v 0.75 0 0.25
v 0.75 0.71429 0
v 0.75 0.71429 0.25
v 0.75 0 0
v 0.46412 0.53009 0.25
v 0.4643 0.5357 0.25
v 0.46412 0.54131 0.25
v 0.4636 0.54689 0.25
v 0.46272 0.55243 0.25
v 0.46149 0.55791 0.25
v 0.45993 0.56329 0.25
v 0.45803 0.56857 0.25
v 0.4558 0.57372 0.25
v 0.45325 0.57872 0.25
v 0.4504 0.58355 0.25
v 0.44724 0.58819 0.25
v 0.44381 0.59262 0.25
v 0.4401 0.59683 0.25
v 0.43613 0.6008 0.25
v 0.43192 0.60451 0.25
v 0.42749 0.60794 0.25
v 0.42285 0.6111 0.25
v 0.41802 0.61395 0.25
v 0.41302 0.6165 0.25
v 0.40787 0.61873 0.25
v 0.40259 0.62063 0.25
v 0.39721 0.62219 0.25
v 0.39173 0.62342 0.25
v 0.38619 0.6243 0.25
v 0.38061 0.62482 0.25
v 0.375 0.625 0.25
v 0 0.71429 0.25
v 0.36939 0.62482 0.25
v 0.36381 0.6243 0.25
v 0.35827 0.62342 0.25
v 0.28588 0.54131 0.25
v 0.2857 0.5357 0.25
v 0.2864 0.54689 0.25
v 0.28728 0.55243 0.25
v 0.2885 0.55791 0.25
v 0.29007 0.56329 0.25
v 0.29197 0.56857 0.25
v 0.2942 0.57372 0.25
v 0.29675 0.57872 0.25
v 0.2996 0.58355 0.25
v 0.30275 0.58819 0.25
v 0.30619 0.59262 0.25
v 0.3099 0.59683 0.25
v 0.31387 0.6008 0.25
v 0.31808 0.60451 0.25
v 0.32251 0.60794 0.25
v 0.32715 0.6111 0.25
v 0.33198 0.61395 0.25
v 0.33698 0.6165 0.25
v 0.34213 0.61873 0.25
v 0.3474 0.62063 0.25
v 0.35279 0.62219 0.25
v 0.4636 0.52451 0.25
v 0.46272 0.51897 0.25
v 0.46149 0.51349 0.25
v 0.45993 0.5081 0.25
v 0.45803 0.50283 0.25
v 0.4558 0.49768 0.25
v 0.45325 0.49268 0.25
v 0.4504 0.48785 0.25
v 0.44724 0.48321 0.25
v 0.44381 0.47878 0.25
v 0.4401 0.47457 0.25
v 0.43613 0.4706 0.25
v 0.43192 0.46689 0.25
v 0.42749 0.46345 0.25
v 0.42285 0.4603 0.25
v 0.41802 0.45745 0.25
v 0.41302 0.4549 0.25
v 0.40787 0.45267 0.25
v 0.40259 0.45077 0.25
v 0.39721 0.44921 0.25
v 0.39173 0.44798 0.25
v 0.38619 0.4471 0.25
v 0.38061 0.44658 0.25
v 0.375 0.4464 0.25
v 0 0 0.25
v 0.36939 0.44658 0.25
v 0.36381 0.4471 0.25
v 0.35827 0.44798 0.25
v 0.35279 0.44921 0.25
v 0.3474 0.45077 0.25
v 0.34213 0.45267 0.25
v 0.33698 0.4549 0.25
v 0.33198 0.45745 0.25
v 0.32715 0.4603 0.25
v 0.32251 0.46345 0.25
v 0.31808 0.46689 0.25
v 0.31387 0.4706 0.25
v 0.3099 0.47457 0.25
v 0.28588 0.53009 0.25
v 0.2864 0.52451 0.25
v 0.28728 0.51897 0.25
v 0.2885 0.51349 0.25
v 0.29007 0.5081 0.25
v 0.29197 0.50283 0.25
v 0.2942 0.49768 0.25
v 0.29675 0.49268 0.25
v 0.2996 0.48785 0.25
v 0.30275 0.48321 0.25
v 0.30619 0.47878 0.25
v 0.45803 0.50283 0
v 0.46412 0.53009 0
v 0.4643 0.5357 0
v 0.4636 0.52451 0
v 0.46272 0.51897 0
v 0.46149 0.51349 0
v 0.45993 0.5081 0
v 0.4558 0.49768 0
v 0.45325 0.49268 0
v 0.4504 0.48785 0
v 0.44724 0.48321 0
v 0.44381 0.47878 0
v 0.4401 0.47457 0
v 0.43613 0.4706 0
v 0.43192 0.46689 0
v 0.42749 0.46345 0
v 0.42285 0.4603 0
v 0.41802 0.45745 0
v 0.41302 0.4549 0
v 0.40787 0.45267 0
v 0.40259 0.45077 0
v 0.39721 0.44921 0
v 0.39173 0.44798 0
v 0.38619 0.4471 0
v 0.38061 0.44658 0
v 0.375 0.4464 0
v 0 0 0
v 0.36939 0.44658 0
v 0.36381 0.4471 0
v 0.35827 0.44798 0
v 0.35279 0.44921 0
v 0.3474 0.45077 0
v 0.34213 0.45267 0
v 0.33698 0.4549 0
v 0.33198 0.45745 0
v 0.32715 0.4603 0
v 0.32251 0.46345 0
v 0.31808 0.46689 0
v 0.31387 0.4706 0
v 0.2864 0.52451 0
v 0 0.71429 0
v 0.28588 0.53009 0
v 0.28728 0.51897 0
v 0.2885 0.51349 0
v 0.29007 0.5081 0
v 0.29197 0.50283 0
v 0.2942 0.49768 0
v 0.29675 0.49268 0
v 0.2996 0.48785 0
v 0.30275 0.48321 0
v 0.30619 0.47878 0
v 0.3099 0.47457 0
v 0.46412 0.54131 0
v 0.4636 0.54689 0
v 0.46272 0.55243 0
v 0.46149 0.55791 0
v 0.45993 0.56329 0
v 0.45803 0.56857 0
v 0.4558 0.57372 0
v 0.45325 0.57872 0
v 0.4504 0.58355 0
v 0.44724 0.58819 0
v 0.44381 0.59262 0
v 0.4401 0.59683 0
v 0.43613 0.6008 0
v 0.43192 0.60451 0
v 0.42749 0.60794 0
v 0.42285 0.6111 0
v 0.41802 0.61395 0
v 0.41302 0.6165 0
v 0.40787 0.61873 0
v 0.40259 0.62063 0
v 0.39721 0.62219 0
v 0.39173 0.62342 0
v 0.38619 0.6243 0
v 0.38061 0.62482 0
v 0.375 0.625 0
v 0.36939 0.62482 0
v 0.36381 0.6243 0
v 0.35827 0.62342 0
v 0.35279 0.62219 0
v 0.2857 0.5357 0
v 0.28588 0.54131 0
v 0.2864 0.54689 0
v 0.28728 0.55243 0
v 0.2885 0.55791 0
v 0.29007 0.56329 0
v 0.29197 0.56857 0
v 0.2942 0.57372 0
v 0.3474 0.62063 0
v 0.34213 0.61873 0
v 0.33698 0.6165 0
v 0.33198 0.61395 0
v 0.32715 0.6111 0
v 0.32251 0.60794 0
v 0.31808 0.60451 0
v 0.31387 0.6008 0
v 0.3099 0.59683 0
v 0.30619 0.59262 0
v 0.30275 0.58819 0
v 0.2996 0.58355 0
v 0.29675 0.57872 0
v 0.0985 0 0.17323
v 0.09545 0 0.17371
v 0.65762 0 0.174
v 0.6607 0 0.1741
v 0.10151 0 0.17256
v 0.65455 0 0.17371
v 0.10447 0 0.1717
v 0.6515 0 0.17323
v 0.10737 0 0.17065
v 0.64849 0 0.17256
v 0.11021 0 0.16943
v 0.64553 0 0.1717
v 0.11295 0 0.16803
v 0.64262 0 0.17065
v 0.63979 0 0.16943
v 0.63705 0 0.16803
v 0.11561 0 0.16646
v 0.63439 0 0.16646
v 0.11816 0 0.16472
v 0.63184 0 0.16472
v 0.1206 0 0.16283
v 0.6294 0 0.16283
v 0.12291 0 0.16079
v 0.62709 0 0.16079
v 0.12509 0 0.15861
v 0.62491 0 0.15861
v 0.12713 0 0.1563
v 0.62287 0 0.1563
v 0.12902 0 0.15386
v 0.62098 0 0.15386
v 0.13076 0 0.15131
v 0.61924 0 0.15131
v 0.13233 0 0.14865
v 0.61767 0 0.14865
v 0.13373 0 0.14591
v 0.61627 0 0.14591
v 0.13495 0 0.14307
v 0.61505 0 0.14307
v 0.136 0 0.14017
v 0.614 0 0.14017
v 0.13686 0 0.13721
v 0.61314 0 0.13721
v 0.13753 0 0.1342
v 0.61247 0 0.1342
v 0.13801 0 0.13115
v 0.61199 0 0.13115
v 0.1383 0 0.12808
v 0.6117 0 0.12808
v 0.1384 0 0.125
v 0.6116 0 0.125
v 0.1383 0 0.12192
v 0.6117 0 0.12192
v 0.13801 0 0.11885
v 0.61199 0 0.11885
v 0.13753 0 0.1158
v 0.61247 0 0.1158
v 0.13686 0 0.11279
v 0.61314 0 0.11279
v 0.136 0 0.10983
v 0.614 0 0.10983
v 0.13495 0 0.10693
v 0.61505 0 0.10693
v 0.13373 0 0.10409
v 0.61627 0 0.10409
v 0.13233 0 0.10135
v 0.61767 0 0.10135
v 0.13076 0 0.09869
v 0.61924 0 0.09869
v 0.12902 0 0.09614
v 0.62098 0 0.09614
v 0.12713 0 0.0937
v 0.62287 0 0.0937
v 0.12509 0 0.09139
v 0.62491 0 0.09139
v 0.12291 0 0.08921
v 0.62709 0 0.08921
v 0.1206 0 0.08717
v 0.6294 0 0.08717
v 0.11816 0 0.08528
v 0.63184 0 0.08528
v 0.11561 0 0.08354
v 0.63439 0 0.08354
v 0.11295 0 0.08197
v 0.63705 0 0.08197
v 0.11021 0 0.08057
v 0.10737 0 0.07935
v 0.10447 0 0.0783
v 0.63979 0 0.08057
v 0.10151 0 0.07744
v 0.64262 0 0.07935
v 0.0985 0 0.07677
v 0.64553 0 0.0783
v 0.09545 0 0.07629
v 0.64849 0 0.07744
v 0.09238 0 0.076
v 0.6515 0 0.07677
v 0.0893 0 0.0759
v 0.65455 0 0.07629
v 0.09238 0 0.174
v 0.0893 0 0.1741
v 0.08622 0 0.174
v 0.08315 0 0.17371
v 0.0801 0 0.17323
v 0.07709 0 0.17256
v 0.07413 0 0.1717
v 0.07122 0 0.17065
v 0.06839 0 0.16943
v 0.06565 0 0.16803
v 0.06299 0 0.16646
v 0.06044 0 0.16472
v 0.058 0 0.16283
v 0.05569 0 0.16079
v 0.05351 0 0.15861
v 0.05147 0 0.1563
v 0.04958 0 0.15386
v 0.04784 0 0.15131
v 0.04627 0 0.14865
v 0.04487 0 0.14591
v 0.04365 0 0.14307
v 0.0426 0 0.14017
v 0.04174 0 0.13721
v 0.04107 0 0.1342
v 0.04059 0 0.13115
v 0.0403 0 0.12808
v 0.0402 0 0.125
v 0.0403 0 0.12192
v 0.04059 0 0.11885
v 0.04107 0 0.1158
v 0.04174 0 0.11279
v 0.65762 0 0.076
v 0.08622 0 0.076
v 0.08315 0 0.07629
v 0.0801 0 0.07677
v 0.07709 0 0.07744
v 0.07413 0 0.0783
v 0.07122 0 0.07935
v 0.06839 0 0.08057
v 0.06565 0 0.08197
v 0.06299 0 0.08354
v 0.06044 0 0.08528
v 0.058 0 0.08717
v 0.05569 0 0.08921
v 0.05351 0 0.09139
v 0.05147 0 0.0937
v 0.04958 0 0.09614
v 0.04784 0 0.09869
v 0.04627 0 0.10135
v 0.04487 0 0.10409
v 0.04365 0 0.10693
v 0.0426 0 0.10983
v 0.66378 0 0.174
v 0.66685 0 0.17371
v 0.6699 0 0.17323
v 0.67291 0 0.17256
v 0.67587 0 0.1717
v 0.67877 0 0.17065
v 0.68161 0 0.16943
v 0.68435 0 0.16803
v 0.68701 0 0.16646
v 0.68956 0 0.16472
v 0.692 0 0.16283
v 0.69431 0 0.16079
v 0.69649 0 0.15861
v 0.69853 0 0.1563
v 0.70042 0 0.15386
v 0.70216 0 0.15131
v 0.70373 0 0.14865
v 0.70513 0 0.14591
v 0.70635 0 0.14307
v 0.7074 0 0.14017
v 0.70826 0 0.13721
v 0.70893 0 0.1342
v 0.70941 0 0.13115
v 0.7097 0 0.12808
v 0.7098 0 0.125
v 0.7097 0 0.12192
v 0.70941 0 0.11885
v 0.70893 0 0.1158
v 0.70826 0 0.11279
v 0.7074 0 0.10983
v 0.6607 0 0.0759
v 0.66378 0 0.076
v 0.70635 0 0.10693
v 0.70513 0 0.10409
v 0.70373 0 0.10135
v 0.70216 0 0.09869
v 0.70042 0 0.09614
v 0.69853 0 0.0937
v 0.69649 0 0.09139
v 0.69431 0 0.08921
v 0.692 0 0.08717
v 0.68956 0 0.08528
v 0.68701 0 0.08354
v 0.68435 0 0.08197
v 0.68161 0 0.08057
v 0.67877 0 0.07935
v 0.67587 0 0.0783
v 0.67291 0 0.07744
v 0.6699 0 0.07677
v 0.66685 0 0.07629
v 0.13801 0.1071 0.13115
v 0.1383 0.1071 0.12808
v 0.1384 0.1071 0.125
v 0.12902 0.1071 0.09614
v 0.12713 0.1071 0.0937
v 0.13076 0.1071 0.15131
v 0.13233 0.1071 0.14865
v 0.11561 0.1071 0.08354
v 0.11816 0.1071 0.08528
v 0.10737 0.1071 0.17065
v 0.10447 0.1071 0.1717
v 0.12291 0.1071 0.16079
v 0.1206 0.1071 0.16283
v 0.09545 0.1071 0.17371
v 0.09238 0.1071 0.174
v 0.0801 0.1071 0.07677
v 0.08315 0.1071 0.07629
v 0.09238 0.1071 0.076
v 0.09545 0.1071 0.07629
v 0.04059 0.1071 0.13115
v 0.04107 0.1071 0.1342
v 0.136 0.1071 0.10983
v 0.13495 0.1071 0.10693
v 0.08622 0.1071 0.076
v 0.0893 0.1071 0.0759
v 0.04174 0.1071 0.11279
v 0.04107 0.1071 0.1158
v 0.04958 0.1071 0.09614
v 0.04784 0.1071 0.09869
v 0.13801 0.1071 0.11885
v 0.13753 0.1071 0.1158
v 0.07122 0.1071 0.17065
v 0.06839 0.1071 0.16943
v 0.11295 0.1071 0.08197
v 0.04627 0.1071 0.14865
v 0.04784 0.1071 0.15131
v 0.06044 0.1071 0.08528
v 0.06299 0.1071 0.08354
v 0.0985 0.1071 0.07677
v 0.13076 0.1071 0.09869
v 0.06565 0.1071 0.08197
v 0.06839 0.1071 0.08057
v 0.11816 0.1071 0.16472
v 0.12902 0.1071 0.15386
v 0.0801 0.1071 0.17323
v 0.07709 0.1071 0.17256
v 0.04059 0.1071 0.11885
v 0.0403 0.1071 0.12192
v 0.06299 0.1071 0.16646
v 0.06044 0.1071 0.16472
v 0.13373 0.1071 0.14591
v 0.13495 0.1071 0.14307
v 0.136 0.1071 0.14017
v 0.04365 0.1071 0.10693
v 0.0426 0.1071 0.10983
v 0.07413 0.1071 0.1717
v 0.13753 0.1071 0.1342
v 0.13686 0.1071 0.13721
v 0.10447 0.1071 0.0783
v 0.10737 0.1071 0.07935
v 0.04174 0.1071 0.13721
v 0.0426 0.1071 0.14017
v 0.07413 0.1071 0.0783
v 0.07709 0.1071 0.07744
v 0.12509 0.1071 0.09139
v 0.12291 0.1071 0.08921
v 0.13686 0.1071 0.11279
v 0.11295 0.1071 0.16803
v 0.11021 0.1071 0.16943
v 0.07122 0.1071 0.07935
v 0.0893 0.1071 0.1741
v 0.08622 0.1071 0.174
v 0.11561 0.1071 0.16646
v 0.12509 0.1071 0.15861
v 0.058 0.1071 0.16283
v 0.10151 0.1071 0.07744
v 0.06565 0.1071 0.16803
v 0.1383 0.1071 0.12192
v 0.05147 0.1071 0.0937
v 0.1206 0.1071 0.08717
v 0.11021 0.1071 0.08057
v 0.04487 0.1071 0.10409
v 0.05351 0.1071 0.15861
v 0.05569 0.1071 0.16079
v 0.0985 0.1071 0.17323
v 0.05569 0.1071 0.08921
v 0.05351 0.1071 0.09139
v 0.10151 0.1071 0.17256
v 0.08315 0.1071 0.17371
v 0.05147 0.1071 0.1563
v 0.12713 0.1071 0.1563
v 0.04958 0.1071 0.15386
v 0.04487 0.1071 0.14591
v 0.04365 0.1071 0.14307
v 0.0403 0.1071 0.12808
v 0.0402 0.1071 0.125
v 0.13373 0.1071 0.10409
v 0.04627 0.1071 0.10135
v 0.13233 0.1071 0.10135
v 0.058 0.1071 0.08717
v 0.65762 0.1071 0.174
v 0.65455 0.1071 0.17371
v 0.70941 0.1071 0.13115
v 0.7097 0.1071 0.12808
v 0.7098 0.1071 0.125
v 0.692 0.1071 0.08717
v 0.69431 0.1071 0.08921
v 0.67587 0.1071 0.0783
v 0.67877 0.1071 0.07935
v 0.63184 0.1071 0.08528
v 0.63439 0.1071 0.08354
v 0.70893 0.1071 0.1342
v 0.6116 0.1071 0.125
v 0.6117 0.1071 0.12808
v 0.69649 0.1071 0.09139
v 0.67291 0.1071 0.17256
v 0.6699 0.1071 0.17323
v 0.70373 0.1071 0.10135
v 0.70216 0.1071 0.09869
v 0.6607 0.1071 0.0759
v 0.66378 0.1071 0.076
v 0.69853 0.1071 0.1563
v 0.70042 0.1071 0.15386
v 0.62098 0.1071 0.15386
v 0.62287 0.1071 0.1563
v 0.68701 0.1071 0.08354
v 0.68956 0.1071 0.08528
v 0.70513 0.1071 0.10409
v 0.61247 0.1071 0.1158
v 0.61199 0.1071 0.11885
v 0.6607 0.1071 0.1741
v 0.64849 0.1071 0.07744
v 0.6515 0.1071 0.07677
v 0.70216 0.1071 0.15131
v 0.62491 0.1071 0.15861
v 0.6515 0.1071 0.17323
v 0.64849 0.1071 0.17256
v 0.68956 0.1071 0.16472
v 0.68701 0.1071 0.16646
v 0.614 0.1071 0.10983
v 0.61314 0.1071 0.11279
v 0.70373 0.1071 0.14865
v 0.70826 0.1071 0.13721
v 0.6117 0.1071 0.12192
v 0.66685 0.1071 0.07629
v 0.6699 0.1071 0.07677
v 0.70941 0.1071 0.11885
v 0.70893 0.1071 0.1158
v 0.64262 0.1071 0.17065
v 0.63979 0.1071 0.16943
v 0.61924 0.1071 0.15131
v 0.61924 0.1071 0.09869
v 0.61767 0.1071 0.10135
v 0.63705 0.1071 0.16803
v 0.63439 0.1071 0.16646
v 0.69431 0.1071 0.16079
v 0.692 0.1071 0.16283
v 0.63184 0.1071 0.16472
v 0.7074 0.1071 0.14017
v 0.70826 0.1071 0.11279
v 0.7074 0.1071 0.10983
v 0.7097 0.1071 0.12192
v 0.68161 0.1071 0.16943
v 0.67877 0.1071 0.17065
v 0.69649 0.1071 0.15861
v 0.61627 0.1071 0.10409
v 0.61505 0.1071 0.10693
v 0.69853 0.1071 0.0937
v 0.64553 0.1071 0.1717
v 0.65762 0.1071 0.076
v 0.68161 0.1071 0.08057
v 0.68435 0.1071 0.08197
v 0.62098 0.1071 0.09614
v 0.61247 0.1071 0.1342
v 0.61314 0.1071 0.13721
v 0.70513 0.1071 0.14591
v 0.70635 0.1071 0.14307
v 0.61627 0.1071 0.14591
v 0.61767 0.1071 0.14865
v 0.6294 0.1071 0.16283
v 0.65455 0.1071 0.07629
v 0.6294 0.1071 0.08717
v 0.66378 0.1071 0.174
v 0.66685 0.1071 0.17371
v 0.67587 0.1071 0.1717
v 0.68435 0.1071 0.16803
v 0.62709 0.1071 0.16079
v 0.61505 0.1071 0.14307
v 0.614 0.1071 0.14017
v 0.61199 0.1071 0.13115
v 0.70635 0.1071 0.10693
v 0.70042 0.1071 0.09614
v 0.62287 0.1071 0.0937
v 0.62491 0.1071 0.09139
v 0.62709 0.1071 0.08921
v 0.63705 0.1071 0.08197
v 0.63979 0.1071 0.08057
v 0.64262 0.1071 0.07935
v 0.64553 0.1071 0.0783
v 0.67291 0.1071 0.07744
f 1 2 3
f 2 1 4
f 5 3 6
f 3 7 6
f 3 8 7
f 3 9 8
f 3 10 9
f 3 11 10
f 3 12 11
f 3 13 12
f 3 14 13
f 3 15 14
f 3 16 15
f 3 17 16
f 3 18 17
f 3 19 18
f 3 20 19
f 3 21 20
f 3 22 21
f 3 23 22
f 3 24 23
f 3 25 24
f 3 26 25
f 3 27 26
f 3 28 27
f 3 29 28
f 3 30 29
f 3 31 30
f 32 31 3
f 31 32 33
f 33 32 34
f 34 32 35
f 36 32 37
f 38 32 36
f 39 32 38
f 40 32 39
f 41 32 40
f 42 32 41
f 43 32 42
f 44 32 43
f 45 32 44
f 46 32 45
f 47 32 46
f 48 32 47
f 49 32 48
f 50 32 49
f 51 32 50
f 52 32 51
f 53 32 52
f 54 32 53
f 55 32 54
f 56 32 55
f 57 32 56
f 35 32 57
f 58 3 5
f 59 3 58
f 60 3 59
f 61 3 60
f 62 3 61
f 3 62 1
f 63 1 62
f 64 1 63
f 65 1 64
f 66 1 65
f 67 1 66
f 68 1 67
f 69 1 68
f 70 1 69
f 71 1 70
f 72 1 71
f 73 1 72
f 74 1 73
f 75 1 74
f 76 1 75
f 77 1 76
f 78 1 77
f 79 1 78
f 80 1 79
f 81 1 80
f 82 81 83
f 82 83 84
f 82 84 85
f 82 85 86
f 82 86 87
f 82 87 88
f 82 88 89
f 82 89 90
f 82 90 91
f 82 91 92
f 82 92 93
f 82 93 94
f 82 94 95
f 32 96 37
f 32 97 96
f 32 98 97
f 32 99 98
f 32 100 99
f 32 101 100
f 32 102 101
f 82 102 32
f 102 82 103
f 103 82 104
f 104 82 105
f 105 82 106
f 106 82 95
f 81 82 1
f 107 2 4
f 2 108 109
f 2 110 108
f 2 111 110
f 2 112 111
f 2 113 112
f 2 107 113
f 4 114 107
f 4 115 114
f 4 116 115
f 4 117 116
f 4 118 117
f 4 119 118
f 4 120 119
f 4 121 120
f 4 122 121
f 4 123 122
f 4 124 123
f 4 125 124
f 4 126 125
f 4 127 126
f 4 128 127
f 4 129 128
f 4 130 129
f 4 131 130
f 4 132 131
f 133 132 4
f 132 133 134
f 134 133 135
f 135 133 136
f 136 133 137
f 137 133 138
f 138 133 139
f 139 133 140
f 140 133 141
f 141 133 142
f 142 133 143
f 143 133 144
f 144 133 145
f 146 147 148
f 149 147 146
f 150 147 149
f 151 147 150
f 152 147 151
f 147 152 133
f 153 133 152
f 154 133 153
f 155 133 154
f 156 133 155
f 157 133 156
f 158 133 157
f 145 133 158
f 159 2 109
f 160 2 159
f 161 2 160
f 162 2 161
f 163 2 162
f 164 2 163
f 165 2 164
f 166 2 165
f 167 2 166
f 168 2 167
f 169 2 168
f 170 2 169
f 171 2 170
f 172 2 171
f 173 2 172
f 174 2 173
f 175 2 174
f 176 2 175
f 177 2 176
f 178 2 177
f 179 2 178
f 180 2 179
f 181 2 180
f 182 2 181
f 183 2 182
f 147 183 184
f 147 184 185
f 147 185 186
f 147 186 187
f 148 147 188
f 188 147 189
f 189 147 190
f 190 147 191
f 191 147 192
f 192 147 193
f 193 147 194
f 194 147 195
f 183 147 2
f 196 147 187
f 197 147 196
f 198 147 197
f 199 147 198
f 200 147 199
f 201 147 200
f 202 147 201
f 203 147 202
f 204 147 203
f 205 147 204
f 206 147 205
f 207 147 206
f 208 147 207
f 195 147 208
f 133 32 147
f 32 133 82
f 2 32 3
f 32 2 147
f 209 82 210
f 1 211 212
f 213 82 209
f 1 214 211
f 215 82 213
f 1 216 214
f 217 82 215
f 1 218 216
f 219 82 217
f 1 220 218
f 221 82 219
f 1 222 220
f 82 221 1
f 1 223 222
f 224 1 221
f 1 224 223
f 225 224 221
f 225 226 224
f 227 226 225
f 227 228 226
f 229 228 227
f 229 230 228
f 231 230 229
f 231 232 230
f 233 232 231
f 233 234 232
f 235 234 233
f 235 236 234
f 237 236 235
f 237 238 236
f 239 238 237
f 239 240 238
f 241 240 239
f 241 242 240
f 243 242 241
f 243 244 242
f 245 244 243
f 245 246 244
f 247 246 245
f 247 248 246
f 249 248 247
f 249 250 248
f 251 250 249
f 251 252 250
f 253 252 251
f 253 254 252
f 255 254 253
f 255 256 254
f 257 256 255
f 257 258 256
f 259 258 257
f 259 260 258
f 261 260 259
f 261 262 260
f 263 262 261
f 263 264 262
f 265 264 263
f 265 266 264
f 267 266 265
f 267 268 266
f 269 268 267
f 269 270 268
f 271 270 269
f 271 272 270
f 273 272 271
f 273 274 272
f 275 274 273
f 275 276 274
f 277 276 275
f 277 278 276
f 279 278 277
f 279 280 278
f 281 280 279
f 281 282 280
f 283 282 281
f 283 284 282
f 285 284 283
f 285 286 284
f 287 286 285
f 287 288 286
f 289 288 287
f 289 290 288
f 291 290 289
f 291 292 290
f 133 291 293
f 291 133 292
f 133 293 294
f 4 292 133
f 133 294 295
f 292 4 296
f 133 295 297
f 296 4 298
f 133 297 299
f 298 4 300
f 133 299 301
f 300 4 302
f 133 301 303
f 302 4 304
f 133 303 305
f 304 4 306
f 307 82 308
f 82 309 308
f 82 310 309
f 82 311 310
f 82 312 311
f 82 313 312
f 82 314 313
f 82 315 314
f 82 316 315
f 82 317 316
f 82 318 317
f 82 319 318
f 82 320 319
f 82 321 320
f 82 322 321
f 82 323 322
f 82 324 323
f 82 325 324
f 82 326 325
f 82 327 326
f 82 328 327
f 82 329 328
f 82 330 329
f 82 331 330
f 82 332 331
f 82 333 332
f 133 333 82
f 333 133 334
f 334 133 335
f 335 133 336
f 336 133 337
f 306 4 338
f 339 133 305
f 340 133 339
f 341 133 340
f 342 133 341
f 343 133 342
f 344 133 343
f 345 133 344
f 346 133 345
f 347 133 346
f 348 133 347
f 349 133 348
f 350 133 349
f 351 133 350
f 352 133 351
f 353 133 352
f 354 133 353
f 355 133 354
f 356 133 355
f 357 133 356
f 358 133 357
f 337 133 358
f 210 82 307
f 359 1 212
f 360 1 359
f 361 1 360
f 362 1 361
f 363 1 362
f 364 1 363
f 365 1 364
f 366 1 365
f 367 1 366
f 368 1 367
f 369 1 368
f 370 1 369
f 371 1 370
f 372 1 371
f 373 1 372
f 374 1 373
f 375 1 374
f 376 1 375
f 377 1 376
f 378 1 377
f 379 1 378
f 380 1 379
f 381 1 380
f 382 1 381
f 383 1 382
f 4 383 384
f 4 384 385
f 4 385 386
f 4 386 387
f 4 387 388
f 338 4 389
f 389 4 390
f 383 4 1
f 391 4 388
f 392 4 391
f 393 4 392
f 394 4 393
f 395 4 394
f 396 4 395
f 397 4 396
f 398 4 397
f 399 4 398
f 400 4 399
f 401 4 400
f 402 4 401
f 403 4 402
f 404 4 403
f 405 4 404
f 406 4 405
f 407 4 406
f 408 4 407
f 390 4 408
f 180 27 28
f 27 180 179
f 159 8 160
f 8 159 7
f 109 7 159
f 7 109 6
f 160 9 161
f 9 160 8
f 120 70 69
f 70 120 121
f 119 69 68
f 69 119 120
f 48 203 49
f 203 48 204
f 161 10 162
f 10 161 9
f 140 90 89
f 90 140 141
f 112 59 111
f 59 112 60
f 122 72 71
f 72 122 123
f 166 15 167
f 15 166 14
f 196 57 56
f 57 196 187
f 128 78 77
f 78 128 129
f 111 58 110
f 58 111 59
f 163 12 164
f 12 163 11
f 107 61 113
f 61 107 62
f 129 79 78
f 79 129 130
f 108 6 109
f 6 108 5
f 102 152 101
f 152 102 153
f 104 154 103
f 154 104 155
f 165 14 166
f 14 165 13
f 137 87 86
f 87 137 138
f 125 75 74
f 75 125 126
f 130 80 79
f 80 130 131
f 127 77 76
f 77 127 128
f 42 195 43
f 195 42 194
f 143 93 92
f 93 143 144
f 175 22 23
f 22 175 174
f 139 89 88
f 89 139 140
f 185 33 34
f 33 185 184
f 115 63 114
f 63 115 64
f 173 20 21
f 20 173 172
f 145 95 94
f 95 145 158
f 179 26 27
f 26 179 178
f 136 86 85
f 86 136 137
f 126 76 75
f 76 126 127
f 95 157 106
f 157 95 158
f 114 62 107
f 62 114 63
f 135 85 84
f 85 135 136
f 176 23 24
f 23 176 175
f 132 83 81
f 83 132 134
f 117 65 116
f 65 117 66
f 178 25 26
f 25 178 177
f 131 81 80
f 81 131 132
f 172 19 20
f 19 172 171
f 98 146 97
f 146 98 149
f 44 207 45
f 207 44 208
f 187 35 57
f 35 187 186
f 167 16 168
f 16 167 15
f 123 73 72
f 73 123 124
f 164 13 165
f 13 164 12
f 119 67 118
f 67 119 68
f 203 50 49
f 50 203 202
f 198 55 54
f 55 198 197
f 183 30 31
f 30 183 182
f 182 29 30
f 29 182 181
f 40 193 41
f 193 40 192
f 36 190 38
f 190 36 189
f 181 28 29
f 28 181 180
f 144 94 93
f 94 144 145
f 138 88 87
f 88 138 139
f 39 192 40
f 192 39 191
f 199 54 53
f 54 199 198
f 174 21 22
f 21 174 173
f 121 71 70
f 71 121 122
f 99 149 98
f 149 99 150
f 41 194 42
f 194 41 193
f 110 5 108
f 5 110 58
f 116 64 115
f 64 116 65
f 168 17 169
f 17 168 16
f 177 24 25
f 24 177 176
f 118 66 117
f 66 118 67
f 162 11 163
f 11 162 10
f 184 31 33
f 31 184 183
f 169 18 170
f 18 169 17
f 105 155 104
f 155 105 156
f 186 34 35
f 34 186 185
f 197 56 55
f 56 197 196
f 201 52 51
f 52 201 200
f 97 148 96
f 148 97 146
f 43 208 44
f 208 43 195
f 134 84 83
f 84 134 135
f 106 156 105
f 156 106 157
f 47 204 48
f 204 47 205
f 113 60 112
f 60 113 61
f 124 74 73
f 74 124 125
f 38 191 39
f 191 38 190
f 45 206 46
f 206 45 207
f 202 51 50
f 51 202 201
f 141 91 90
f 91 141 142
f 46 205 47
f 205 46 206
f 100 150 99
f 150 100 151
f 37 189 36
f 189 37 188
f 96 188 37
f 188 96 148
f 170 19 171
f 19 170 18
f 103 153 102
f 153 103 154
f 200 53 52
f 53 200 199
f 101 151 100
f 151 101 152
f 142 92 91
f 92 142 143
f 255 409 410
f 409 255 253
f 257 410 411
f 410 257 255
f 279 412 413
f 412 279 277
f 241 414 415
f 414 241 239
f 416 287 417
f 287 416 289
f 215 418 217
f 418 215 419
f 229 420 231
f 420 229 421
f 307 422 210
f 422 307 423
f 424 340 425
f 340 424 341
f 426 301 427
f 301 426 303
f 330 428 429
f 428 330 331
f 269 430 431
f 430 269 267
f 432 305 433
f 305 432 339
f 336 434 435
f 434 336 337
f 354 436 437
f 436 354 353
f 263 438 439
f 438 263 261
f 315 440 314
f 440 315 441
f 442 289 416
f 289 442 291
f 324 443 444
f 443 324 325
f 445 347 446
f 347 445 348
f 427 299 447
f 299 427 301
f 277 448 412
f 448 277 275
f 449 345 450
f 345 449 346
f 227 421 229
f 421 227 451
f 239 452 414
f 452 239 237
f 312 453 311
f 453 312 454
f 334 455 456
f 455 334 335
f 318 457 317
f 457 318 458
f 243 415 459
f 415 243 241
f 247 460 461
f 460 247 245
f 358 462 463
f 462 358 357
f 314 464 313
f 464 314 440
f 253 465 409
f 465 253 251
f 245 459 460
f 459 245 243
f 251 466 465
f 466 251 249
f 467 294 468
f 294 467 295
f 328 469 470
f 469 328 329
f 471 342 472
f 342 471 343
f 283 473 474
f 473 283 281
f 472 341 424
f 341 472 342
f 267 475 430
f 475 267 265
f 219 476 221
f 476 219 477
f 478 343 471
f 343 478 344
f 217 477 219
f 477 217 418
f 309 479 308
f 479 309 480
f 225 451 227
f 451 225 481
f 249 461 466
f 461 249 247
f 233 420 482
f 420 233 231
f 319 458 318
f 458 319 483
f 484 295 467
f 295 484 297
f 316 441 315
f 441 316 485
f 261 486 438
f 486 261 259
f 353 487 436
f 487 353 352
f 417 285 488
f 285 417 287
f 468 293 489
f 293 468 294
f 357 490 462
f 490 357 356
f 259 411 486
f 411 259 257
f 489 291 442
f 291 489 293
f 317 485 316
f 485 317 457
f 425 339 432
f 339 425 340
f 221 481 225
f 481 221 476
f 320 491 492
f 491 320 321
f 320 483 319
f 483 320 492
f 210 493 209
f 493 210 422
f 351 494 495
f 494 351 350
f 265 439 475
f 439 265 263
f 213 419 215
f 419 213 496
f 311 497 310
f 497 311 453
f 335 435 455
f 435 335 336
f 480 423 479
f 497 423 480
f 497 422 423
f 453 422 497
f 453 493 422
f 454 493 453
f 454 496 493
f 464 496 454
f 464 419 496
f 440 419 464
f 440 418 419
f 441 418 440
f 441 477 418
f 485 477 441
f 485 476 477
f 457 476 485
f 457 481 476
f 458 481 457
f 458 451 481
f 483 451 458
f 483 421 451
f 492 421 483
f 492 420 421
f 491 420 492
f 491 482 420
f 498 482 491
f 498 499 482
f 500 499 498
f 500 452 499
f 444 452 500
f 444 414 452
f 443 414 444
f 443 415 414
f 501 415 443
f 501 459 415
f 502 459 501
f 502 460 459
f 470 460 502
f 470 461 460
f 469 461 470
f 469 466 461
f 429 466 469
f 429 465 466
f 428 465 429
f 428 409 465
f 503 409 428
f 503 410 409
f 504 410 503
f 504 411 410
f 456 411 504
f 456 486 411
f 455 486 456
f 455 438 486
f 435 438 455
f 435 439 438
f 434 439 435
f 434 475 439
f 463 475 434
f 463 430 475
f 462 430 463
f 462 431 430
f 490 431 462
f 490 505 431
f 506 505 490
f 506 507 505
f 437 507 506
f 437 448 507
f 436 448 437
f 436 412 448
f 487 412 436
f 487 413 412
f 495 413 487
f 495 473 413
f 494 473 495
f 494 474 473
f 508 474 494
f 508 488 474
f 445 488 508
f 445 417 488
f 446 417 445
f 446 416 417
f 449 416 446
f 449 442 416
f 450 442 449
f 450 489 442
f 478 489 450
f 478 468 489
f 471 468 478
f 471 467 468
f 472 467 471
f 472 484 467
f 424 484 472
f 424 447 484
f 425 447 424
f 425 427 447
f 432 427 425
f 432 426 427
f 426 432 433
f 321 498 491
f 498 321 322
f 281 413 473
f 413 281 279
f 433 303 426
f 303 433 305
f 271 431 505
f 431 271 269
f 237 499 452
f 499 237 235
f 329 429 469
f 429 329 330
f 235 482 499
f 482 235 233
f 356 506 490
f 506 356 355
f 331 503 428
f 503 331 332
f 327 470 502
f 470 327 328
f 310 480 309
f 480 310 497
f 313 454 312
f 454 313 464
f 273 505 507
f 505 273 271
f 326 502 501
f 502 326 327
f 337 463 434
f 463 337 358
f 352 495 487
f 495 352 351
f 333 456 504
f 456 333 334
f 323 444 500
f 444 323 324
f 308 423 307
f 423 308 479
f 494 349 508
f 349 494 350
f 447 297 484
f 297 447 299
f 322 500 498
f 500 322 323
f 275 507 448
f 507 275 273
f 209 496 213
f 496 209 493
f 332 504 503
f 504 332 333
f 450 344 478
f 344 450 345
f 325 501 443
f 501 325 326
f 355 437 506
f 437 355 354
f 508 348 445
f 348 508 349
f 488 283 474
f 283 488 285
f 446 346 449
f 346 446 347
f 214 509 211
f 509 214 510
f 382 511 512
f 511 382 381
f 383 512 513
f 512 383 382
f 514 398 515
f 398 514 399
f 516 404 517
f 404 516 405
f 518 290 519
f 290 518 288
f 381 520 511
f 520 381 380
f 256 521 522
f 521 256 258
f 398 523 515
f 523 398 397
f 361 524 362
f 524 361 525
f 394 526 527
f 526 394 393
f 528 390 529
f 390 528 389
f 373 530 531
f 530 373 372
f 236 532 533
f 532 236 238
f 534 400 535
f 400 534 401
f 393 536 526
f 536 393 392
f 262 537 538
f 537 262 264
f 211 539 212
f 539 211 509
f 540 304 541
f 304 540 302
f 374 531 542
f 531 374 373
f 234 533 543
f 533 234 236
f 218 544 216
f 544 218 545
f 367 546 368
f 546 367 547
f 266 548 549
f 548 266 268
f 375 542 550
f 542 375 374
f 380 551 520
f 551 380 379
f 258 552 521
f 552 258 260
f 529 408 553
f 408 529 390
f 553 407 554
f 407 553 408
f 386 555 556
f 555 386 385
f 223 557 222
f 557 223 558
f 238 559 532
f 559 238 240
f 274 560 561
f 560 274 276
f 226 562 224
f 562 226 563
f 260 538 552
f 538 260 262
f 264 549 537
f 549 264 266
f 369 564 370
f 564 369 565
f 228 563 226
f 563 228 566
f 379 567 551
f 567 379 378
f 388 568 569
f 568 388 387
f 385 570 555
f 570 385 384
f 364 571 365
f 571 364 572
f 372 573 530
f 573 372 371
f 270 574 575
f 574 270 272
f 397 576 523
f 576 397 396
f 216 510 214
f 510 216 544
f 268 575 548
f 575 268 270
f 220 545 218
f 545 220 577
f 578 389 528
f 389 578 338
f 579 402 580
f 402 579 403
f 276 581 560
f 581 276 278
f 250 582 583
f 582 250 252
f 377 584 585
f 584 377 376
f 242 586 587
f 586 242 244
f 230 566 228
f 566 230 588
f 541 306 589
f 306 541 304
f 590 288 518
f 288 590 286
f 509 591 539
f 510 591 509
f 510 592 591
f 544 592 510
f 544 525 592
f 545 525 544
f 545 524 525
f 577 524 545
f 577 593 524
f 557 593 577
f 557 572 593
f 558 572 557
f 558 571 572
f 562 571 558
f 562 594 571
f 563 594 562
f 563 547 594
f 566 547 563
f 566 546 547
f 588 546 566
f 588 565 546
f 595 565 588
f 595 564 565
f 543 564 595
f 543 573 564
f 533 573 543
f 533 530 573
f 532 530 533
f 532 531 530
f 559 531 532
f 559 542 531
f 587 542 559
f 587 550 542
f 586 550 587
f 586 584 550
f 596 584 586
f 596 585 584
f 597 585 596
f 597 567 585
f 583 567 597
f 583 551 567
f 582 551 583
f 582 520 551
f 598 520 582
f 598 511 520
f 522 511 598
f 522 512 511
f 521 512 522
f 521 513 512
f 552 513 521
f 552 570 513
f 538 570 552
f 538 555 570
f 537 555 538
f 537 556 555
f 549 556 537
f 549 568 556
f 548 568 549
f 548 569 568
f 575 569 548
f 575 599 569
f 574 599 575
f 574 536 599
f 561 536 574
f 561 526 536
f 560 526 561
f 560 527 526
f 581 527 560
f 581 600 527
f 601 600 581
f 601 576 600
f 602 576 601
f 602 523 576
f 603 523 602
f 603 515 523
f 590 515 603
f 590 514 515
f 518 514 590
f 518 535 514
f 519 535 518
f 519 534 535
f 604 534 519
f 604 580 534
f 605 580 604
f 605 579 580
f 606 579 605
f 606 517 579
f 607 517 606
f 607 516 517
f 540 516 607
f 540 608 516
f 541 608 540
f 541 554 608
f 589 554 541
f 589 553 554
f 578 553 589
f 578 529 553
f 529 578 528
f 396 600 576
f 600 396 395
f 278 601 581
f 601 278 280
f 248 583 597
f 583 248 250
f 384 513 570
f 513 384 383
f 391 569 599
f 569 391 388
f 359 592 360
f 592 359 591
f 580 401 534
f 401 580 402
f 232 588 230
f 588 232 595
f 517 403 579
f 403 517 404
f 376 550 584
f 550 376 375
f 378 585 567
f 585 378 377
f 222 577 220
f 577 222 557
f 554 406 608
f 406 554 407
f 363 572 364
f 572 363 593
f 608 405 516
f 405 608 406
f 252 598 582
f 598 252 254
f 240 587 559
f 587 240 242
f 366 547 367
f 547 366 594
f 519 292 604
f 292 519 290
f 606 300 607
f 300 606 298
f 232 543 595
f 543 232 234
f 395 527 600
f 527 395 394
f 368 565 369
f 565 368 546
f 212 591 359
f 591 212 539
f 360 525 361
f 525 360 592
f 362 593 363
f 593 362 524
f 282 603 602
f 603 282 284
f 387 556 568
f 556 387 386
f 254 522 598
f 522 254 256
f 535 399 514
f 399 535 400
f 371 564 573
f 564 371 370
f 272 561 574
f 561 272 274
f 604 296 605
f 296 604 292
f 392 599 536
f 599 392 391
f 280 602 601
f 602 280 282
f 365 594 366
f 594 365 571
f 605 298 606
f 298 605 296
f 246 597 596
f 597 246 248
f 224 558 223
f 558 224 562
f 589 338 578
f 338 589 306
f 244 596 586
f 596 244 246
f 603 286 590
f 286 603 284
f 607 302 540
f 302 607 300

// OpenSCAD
// --------------------------
// Global Resolution Setting
// --------------------------
$fn = 100; // Smooth curve rendering

// --------------------------
// Overall Model Parameters
// --------------------------
overall_length = 0.75;       // X-axis dimension (left to right)
overall_width = 0.714286;    // Y-axis dimension (front to back)
overall_height = 0.25;       // Z-axis dimension (base underside to top)

// --------------------------
// Through Hole Parameters
// --------------------------
through_hole_x = 0.375;      // X position from left edge
through_hole_y = 0.5357;     // Y position from front edge
through_hole_r = 0.0893;     // Radius of through opening

// --------------------------
// Front Blind Cut Parameters
// --------------------------
blind_cut_r = 0.0491;        // Radius of front face cylindrical cuts
blind_cut_depth = 0.1071;    // Depth of cuts into front face
blind_cut_z_low = 0.0759;    // Lowest Z point of cut profile
blind_cut_z_high = 0.1741;   // Highest Z point of cut profile
blind_cut1_x = 0.0893;       // X position of left blind cut
blind_cut2_x = 0.6607;       // X position of right blind cut
blind_cut_center_z = (blind_cut_z_low + blind_cut_z_high) / 2; // Mid height of cuts

// --------------------------
// Main Model Assembly
// --------------------------
difference() {
    // Main stepped base block (full overall dimensions)
    cube([overall_length, overall_width, overall_height], center=false);

    // 1. Through hole cut (full height penetration)
    translate([through_hole_x, through_hole_y, overall_height/2])
        cylinder(h=overall_height + 0.1, r=through_hole_r, center=true);

    // 2. Left front blind cylindrical cut
    translate([blind_cut1_x, blind_cut_depth/2, blind_cut_center_z])
        rotate([90, 0, 0]) // Rotate cylinder to align with Y axis (into front face)
            cylinder(h=blind_cut_depth, r=blind_cut_r, center=true);

    // 3. Right front blind cylindrical cut
    translate([blind_cut2_x, blind_cut_depth/2, blind_cut_center_z])
        rotate([90, 0, 0]) // Rotate cylinder to align with Y axis (into front face)
            cylinder(h=blind_cut_depth, r=blind_cut_r, center=true);
}
